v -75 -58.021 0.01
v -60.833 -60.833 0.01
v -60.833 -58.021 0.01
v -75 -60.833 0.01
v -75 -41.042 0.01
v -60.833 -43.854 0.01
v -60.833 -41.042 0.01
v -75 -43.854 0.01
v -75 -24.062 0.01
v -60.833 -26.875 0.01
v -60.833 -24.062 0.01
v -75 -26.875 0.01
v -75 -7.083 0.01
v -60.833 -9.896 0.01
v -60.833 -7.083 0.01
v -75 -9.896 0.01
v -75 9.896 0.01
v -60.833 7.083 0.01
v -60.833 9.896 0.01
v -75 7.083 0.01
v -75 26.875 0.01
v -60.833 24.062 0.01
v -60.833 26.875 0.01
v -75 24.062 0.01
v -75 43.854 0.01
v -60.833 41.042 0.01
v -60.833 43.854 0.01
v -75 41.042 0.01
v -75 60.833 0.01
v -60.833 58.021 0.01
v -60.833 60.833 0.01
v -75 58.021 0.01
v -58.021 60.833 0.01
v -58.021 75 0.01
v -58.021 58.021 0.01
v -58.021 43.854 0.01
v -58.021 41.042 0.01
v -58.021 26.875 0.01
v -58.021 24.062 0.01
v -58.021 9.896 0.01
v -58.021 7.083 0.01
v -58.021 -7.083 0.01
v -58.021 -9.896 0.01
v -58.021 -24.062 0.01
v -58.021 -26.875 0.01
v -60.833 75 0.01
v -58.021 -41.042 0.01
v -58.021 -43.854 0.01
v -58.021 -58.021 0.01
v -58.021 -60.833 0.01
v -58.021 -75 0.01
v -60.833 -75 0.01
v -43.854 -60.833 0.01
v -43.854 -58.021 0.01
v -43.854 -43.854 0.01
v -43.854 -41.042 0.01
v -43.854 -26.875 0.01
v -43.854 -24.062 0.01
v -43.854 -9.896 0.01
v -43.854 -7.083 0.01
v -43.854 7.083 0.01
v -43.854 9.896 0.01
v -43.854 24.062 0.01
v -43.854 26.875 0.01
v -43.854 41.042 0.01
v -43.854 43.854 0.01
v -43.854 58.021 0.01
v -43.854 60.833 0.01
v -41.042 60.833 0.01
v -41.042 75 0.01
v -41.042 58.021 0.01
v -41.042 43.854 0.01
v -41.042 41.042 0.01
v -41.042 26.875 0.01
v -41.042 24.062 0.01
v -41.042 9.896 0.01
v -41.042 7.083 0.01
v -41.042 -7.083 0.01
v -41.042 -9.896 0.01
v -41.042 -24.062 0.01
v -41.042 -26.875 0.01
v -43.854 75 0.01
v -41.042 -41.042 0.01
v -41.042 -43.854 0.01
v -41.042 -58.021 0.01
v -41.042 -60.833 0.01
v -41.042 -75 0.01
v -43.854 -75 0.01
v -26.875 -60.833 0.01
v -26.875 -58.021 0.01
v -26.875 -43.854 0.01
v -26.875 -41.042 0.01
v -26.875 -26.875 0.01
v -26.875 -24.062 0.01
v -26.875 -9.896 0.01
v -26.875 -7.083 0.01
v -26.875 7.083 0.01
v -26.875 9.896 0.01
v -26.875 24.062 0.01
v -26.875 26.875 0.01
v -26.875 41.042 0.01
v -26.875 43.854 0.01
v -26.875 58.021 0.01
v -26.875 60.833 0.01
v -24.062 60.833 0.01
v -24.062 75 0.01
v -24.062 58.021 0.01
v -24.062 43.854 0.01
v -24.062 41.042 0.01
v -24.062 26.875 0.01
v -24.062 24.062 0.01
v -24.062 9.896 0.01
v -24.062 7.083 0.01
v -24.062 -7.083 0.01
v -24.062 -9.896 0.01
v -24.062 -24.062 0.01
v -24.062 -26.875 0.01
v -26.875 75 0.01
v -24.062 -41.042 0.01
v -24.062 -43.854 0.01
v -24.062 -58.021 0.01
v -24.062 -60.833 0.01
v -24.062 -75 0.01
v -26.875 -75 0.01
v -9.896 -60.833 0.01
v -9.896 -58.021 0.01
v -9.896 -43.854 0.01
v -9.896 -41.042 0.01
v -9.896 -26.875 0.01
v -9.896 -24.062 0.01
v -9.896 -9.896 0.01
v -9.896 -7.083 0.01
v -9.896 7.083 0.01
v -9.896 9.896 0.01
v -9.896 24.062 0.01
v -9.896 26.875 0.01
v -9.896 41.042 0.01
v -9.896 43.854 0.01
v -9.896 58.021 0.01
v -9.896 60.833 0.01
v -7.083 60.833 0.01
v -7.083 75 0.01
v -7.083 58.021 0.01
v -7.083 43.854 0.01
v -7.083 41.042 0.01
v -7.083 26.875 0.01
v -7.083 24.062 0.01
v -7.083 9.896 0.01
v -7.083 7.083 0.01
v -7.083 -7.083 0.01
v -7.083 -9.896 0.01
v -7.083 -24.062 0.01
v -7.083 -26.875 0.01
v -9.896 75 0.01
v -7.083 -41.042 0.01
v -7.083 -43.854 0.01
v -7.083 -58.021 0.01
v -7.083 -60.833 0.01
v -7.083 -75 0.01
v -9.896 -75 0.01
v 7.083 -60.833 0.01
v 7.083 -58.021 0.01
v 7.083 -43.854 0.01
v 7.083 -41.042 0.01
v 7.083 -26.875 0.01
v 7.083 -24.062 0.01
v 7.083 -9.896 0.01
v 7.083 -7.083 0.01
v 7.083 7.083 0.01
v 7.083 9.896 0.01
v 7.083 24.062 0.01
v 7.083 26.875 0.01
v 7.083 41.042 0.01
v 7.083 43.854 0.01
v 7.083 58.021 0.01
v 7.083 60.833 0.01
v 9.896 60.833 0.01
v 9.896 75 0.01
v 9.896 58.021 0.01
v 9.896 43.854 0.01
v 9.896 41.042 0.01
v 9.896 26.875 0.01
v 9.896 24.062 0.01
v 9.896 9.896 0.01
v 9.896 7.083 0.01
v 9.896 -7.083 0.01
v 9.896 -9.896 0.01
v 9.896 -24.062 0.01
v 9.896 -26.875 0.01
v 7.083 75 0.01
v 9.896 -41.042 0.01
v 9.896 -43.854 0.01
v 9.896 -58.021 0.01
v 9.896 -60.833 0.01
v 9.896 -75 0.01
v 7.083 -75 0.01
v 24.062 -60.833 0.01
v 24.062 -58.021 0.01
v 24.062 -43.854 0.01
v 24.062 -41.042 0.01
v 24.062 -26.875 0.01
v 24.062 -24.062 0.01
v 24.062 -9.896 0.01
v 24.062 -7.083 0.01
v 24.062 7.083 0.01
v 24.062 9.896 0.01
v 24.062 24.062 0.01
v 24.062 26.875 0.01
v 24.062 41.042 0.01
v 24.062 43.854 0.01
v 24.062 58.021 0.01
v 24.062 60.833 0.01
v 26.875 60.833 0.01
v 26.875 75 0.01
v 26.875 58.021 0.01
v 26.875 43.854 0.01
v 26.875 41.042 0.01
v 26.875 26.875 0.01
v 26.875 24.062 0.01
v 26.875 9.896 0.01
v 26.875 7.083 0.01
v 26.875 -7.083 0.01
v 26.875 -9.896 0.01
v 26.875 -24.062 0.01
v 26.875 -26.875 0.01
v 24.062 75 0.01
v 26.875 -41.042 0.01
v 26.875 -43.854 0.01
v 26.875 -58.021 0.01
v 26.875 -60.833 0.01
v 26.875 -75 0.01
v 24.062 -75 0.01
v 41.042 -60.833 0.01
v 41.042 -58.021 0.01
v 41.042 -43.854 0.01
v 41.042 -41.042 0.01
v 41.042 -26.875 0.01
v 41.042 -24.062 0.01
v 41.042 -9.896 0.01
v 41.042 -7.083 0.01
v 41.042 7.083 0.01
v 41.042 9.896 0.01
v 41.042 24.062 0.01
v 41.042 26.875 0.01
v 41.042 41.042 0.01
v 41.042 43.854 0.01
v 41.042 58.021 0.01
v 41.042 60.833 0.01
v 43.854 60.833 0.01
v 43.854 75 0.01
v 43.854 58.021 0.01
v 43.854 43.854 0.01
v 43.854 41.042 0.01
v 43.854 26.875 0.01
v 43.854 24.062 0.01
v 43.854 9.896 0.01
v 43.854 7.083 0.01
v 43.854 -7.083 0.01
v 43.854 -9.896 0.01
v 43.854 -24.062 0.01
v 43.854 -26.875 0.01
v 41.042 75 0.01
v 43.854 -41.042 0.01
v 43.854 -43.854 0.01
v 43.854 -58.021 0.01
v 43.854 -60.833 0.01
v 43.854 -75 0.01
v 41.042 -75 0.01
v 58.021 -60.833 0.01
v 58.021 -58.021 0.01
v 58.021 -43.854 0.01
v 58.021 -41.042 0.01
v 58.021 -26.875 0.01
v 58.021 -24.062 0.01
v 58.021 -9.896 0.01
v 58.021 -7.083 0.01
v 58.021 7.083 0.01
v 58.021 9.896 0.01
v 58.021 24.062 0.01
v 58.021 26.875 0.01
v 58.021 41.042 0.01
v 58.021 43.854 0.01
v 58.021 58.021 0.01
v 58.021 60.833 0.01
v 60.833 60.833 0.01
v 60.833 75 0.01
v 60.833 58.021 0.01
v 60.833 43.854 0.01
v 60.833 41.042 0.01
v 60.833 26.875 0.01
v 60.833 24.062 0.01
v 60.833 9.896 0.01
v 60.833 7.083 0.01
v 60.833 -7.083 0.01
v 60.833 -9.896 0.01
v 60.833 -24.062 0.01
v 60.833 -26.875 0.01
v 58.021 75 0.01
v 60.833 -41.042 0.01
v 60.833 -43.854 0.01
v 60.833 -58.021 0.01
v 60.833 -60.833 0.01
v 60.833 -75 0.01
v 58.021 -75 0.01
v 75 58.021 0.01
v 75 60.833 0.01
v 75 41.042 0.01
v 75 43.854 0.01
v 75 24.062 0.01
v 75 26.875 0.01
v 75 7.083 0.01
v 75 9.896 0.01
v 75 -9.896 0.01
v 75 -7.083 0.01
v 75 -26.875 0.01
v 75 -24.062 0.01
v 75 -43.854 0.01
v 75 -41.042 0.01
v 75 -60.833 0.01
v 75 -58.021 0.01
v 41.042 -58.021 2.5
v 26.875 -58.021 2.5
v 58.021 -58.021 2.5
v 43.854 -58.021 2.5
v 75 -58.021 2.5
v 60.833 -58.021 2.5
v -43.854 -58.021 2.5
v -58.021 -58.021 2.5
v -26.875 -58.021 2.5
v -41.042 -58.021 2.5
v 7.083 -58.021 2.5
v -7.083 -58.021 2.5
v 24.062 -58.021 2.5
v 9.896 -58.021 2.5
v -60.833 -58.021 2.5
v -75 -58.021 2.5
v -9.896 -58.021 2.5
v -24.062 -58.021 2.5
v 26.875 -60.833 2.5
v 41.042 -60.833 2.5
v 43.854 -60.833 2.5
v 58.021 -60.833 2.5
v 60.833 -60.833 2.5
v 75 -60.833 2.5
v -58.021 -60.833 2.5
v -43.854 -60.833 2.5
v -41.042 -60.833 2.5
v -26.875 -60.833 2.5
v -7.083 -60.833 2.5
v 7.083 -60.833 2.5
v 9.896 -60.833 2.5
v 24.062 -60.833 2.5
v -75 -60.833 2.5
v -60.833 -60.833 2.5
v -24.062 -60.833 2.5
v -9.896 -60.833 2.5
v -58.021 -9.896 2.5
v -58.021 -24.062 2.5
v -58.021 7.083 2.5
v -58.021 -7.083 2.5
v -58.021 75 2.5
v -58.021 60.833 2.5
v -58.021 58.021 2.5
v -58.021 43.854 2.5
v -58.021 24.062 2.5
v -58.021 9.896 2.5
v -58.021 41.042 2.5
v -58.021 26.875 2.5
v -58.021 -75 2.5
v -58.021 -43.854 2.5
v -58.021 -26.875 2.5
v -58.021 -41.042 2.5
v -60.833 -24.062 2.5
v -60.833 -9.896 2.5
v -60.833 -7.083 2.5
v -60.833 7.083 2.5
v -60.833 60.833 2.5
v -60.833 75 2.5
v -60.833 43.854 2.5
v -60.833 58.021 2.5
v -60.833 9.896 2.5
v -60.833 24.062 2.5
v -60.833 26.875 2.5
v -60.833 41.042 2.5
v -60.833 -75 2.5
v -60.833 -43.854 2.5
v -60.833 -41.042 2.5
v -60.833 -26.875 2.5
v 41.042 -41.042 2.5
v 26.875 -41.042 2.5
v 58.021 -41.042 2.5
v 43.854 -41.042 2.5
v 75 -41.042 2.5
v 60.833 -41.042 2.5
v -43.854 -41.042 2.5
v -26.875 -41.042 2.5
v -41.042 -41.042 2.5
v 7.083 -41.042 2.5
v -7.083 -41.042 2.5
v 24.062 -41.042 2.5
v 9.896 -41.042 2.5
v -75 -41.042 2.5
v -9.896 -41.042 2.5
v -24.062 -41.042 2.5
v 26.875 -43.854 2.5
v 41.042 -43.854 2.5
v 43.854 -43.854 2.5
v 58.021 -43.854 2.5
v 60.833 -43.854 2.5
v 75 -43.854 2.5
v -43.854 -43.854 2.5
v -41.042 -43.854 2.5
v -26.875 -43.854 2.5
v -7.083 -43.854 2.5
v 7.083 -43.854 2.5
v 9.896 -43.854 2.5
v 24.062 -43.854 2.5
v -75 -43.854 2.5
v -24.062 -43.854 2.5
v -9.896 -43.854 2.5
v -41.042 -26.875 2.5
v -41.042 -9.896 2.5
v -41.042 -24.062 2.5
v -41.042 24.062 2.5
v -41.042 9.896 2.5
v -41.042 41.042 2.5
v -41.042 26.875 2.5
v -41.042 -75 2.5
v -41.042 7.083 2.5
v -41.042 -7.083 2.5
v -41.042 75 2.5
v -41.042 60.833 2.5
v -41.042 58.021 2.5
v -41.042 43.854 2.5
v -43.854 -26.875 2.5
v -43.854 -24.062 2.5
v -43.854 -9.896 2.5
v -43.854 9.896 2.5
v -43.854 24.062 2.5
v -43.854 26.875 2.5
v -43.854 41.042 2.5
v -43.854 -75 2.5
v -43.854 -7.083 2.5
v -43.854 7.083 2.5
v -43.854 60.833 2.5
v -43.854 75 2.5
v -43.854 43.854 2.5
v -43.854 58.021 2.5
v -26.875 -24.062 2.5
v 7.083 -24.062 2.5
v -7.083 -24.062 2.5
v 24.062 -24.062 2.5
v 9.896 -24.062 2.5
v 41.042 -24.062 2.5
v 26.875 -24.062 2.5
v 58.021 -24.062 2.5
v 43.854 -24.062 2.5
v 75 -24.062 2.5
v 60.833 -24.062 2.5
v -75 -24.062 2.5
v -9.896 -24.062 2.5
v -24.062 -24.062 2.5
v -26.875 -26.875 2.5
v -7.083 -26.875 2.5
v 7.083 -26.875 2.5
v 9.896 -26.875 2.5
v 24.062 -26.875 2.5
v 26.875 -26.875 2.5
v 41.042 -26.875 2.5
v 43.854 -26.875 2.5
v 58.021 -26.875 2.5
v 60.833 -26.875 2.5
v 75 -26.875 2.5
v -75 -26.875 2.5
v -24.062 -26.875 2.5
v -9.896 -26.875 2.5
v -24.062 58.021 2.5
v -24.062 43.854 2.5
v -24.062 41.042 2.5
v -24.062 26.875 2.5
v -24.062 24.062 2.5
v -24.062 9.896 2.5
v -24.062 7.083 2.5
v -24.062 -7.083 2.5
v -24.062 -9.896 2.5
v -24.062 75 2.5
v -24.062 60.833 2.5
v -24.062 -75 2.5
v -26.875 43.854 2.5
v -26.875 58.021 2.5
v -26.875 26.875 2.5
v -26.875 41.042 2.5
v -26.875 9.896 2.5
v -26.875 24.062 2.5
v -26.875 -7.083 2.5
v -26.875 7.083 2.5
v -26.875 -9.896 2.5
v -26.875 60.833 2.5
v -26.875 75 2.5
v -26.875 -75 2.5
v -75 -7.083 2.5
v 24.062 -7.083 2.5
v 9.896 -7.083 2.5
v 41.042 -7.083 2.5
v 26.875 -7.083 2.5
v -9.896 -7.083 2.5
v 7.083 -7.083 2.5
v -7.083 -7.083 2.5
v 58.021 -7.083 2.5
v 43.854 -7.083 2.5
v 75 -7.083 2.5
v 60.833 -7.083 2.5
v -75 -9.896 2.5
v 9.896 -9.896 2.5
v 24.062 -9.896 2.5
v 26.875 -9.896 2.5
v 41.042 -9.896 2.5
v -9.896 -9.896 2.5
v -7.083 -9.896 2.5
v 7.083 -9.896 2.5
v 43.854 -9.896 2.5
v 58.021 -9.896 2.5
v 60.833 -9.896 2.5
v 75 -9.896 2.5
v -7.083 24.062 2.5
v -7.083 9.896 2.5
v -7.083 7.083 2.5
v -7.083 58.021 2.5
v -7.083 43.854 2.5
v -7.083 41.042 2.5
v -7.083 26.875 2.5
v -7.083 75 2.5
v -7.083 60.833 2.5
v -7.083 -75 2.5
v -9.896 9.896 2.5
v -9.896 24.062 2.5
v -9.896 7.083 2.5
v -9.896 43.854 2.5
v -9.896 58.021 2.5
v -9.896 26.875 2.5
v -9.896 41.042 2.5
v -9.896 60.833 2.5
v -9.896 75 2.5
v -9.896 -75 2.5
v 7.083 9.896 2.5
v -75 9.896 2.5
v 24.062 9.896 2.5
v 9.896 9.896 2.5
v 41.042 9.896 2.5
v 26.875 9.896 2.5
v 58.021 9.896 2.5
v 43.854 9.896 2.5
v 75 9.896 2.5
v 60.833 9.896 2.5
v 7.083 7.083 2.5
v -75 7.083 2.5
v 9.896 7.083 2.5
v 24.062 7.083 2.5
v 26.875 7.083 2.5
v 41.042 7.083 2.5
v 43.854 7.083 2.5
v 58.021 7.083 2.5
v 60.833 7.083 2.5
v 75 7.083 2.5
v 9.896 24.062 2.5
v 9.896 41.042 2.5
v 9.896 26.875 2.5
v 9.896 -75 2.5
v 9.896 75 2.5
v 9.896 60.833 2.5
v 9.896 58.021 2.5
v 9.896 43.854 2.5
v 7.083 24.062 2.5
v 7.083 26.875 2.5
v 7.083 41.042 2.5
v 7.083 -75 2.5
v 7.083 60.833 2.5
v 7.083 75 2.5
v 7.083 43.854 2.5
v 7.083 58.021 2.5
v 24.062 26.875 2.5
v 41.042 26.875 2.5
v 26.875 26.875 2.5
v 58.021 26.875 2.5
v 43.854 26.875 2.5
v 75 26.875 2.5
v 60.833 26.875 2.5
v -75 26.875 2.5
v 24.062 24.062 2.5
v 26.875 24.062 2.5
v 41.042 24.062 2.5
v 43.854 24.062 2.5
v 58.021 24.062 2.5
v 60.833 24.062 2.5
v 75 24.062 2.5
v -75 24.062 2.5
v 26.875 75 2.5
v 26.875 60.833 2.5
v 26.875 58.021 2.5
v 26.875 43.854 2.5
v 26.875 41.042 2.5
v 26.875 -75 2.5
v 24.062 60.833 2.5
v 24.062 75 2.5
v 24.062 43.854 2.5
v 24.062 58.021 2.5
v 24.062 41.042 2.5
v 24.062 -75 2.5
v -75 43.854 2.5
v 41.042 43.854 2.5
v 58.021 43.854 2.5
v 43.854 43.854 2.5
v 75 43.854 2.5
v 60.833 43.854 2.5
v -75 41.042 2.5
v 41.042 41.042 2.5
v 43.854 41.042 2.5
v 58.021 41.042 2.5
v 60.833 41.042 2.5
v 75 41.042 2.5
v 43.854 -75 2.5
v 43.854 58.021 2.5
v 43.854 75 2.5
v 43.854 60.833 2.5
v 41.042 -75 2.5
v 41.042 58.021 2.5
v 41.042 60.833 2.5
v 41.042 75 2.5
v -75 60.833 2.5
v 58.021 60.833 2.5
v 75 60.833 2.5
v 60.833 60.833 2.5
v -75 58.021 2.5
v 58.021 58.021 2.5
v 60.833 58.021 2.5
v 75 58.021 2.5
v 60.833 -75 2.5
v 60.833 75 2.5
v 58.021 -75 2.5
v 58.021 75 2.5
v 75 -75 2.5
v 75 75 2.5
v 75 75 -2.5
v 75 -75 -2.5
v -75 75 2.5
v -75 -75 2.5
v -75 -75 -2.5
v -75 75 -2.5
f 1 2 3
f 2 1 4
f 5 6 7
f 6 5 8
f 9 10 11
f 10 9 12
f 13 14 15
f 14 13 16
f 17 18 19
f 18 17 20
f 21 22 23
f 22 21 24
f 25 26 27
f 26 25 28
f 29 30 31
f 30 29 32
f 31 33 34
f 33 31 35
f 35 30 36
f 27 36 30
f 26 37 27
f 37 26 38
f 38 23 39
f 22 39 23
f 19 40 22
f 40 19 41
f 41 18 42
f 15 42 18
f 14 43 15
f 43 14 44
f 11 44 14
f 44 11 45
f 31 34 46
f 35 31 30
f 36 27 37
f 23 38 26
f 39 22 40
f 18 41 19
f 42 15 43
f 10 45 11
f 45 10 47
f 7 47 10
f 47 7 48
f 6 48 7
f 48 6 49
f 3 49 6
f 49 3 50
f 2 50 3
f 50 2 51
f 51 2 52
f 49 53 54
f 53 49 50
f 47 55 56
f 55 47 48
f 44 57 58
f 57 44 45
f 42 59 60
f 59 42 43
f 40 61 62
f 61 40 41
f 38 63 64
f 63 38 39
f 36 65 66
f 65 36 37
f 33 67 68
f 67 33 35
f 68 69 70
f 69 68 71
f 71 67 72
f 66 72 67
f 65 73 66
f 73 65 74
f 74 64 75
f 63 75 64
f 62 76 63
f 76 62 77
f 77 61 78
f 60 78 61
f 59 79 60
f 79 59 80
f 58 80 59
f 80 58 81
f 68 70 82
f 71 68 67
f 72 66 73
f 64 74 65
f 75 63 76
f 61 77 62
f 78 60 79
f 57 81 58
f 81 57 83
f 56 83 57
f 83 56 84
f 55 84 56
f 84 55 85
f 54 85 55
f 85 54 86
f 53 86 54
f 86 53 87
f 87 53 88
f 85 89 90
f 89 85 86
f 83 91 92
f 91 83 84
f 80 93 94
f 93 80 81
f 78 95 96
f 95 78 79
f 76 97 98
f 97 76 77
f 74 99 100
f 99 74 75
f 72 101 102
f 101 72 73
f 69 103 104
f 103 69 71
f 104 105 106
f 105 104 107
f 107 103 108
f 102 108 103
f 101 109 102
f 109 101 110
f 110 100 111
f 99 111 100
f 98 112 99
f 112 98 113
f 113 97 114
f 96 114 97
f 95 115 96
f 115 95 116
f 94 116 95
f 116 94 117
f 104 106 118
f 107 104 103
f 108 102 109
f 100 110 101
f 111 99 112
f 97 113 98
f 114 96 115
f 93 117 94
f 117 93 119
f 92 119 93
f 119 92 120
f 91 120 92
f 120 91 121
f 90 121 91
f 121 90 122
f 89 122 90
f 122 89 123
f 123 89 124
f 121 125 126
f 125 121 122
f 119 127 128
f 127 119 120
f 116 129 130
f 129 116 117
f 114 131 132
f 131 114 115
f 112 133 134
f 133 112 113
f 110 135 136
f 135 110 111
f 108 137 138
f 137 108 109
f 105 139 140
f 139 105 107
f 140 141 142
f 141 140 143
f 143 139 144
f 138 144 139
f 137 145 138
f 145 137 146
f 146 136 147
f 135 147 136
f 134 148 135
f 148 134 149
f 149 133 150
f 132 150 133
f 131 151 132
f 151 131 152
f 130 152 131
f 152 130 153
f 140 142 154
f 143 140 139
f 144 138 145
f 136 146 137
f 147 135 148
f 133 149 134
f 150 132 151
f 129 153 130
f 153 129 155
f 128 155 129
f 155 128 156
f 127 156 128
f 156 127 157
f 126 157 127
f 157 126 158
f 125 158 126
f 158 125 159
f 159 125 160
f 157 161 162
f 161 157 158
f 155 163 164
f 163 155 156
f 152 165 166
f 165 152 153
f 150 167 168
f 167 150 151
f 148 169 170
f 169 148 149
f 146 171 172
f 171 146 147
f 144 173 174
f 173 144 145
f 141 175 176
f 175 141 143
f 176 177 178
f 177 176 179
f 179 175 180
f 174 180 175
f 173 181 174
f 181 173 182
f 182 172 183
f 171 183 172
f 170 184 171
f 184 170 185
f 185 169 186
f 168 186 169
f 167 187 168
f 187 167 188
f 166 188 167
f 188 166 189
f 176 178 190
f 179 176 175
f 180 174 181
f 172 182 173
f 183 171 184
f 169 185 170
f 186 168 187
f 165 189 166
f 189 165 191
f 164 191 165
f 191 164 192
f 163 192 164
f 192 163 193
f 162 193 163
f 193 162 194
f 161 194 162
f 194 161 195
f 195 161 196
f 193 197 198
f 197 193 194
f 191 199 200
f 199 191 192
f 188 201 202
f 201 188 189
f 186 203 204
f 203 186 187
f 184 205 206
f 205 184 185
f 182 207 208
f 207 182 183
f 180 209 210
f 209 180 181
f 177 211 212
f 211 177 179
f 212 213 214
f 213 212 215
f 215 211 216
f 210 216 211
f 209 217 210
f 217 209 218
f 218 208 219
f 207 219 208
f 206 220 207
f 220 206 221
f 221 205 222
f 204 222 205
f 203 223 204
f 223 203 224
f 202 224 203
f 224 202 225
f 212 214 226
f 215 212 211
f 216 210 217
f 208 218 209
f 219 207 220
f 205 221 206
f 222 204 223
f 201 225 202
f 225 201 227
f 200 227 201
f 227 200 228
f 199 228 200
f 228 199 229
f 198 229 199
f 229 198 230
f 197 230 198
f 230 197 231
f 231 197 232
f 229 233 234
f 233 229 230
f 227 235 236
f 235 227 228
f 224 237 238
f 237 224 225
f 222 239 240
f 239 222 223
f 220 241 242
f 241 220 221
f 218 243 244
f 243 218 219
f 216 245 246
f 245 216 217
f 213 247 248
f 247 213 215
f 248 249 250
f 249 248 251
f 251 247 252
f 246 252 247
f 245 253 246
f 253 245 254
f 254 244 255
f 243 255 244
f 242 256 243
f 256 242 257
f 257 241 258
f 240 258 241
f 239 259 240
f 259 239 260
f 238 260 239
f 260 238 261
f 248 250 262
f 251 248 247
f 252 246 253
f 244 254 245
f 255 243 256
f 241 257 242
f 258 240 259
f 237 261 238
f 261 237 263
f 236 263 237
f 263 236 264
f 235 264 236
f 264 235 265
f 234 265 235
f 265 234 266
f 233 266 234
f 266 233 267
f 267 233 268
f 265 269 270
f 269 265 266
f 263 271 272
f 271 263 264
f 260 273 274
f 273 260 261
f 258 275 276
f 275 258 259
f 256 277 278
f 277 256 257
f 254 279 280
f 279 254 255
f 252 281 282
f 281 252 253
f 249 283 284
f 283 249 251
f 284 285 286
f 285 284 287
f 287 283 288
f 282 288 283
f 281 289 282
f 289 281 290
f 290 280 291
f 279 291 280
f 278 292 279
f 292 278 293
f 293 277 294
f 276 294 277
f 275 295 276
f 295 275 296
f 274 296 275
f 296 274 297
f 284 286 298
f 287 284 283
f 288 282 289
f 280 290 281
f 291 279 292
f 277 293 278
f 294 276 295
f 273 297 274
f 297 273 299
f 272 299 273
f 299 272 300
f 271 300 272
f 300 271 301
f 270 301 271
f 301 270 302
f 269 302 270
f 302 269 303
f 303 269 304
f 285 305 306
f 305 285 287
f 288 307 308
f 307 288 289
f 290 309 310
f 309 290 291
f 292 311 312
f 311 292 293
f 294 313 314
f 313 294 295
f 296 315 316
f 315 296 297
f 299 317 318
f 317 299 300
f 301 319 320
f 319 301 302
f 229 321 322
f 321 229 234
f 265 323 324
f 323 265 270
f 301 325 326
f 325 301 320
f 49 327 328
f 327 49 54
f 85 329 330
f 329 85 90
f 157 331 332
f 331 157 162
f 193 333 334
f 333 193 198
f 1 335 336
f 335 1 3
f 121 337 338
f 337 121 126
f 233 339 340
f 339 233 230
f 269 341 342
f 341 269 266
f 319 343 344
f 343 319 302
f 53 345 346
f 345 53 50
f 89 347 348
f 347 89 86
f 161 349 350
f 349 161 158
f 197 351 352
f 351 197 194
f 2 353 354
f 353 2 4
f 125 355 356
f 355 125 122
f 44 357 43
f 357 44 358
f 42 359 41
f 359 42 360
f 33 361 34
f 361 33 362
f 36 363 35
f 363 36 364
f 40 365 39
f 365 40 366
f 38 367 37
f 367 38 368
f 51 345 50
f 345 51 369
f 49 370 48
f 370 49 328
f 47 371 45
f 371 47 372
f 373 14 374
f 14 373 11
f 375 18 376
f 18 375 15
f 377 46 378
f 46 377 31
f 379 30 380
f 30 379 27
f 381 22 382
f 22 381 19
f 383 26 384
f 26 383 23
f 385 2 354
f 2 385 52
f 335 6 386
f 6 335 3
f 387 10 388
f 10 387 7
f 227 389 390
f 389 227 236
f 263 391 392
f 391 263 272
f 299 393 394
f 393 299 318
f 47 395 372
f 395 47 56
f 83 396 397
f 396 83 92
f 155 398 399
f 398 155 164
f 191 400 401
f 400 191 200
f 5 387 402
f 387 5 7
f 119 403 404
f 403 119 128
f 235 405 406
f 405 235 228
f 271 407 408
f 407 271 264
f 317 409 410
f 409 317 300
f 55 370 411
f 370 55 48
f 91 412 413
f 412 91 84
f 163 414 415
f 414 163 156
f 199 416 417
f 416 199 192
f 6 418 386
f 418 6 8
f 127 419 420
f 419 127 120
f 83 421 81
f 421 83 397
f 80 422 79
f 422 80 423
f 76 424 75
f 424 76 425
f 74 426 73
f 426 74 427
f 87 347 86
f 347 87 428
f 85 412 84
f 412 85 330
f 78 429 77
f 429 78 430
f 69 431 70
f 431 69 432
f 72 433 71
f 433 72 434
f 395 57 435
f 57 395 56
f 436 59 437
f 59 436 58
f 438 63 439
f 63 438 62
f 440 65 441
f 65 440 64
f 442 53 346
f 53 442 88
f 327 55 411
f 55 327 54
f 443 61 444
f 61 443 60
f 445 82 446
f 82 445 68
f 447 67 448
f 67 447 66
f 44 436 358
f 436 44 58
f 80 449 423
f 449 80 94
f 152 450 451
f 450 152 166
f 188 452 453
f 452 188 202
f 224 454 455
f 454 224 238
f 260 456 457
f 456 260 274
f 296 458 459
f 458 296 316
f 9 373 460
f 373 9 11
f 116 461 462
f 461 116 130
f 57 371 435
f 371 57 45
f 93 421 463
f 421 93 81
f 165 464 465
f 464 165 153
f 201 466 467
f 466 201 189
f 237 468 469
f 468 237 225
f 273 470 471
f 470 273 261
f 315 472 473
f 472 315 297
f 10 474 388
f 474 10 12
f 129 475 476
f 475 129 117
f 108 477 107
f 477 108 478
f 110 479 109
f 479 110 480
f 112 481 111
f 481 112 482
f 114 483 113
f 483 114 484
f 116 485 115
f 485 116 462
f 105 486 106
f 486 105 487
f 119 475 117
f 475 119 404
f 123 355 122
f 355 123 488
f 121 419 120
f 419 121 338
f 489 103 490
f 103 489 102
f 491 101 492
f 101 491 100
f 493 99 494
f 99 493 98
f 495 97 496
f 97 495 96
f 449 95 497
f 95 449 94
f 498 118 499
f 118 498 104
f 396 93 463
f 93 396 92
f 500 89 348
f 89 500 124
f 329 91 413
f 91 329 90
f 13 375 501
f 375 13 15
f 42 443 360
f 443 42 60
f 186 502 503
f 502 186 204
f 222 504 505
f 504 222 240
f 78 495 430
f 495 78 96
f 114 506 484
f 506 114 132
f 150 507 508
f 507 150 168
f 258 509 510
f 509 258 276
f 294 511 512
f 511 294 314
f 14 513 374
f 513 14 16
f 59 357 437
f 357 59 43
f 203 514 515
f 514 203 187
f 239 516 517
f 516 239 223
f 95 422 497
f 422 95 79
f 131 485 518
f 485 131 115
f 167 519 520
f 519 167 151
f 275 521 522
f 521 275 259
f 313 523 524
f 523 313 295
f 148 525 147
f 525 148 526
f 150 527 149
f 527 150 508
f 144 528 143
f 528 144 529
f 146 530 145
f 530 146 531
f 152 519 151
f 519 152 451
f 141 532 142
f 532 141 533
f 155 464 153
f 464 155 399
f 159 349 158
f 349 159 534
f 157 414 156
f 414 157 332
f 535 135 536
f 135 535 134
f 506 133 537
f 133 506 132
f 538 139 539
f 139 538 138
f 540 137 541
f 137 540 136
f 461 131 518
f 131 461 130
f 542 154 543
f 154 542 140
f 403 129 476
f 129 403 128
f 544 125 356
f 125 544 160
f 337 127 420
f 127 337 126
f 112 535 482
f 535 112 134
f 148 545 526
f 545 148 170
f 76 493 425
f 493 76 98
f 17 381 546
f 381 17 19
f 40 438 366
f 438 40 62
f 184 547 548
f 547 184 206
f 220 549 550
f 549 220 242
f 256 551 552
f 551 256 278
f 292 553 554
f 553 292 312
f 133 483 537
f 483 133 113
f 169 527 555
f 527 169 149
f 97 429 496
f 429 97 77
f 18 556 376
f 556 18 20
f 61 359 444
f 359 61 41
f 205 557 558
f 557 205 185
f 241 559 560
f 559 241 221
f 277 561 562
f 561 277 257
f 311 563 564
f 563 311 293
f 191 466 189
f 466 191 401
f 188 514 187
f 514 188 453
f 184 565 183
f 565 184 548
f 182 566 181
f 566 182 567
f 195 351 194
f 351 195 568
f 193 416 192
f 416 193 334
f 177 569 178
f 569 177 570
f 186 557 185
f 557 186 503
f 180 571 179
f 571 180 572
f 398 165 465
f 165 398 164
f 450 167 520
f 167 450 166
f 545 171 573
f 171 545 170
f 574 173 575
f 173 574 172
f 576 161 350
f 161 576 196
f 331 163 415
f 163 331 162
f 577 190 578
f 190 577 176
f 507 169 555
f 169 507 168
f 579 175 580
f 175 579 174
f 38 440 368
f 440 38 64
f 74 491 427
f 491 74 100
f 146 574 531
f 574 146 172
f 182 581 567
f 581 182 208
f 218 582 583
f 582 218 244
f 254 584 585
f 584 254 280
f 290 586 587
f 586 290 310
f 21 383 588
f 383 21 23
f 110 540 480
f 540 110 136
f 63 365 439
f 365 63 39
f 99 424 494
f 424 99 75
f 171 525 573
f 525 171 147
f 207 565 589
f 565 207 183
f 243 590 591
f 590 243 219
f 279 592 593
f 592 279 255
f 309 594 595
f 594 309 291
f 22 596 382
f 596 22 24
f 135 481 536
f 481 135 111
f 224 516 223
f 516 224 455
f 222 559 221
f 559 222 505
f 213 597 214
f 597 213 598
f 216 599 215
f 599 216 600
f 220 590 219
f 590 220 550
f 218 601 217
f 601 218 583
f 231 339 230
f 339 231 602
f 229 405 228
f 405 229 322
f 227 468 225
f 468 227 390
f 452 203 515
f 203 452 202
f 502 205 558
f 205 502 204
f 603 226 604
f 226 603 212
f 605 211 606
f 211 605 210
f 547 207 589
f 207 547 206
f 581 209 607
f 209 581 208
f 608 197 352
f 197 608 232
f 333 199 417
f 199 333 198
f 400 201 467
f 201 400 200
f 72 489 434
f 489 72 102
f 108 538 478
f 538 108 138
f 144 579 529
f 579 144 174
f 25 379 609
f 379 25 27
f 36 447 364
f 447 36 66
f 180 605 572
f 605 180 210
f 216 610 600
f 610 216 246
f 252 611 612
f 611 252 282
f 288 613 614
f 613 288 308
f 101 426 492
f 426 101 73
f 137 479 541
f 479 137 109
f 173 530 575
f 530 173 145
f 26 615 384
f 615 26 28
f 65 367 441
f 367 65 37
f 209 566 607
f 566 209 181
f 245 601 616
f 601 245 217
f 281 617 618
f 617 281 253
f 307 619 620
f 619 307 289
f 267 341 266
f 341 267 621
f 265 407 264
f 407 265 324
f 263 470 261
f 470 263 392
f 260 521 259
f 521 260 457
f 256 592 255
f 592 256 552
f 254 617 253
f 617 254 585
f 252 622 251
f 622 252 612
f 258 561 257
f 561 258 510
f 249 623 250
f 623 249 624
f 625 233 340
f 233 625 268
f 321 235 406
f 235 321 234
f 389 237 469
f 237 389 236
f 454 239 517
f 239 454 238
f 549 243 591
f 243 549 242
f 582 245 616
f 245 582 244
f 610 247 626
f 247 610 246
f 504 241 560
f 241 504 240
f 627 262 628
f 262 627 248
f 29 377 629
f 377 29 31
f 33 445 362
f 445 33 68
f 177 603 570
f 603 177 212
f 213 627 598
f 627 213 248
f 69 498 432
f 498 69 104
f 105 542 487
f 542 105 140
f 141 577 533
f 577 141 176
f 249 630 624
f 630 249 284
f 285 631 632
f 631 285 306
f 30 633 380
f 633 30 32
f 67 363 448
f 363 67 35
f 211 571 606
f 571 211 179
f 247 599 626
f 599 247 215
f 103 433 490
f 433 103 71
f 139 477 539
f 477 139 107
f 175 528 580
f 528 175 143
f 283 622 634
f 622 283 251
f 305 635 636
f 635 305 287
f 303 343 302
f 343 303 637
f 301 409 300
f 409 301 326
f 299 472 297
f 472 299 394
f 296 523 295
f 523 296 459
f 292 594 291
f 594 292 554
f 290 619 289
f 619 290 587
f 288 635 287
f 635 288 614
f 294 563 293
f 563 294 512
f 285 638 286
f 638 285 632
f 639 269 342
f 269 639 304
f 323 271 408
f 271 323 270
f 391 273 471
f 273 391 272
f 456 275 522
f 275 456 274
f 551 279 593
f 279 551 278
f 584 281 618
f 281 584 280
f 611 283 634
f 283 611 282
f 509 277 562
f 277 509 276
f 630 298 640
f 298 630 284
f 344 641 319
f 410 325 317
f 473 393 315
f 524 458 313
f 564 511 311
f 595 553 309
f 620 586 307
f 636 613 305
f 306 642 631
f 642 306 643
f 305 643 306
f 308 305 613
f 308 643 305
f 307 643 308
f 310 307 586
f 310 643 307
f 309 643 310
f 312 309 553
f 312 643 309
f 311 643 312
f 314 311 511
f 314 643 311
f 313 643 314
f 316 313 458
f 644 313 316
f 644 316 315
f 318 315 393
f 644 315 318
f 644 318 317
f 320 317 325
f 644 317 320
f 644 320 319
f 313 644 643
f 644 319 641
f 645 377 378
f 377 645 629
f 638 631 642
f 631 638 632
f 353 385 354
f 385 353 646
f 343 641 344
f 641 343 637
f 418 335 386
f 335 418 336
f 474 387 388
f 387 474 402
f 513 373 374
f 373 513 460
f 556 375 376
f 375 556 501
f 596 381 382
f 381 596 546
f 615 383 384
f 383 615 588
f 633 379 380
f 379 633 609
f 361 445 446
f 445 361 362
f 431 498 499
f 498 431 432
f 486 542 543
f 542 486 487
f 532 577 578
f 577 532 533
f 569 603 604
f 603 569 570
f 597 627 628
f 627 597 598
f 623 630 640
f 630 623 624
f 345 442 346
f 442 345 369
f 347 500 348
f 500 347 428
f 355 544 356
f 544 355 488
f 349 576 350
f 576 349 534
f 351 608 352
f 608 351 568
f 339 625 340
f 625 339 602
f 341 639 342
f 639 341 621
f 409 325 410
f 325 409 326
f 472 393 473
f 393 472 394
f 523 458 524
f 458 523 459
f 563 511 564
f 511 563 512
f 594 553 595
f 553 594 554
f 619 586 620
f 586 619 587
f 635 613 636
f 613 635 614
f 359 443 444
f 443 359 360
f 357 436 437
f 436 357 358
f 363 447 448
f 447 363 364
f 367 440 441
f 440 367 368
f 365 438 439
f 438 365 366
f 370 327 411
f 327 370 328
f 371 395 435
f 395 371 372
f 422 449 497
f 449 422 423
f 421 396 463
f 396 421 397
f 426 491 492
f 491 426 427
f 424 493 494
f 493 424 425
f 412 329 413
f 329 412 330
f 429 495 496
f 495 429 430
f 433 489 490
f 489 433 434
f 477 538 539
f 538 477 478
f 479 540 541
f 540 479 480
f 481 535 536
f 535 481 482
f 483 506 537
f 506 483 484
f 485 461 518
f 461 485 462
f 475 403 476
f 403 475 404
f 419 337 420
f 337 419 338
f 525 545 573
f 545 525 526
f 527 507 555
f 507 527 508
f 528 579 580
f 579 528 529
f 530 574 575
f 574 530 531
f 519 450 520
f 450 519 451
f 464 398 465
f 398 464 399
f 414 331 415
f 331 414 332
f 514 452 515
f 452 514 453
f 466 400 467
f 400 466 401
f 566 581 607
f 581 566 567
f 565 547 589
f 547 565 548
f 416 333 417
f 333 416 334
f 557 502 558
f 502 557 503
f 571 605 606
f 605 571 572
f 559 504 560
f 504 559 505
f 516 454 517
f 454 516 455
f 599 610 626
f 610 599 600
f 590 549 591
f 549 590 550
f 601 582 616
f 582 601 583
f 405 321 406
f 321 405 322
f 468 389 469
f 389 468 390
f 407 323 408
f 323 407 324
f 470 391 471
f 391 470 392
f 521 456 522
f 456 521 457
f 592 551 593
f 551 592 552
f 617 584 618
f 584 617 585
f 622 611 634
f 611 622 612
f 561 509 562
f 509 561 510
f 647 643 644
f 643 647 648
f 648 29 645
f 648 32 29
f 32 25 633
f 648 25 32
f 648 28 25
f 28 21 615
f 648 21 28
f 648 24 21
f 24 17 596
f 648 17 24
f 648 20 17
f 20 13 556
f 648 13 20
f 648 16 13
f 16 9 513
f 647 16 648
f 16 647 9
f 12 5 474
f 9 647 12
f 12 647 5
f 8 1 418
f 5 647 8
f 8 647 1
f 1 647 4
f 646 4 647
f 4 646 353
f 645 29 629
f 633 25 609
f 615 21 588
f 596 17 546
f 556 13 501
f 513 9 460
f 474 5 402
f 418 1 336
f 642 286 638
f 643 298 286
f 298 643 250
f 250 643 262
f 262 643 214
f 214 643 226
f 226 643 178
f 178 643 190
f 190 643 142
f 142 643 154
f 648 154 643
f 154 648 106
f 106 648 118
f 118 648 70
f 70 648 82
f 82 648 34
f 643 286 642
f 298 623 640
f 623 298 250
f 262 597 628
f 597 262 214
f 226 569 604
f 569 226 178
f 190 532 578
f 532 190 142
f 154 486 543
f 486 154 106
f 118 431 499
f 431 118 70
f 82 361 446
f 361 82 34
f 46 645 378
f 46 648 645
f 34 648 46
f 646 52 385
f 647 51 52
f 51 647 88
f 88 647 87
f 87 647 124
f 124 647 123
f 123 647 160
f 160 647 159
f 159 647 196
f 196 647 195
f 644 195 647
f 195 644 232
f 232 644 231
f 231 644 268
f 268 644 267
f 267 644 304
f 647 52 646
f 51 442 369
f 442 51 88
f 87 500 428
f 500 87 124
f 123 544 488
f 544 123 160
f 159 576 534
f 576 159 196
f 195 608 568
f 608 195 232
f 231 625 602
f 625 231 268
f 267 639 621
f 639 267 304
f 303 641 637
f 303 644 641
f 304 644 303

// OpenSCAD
// table width
tw=150;
// table height
th=5;
// wall height
wh=15;
// slack
s=0.3;


// number of ditches
dn=8;
dr=0.15;

// epsilon
e = 0.01;


// DITCHES

// width
dw=tw*dr/dn;
// height
dh=th/2;
// distance
fw=tw+dw;
dd=fw/(dn+1);

// WALLS

// width
ww=dw-2*s;
wl=2*dd-dw;

//mini_board();
board();
//wall();

module wall() {
    rotate([0, -90, 0])
    cube(size=[ww, wl, wh]);
}

module mini_board() {
    translate([-wl/2 + tw/2, -wl/2 + tw/2, th/2])
    intersection() {
        translate([-tw + wl - e, -tw + wl - e, 0])
        cube(size=tw, center=true);
        
        board();
    }
}

module board() {
    difference() {
        blank_board();
        ditches();
    }
}

module blank_board() {
    cube(size=[tw, tw, th], center=true);
}

module ditches() {
    sx = -tw/2 -dw/2;
    for (d = [1 : dn]) {
        translate([0, sx + d*dd, dh/2 + e])
        cube(size=[tw+1, dw, th/2], center=true);
        
        translate([sx + d*dd, 0, dh/2 + e])
        cube(size=[dw, tw+1, th/2], center=true);
    }
}
